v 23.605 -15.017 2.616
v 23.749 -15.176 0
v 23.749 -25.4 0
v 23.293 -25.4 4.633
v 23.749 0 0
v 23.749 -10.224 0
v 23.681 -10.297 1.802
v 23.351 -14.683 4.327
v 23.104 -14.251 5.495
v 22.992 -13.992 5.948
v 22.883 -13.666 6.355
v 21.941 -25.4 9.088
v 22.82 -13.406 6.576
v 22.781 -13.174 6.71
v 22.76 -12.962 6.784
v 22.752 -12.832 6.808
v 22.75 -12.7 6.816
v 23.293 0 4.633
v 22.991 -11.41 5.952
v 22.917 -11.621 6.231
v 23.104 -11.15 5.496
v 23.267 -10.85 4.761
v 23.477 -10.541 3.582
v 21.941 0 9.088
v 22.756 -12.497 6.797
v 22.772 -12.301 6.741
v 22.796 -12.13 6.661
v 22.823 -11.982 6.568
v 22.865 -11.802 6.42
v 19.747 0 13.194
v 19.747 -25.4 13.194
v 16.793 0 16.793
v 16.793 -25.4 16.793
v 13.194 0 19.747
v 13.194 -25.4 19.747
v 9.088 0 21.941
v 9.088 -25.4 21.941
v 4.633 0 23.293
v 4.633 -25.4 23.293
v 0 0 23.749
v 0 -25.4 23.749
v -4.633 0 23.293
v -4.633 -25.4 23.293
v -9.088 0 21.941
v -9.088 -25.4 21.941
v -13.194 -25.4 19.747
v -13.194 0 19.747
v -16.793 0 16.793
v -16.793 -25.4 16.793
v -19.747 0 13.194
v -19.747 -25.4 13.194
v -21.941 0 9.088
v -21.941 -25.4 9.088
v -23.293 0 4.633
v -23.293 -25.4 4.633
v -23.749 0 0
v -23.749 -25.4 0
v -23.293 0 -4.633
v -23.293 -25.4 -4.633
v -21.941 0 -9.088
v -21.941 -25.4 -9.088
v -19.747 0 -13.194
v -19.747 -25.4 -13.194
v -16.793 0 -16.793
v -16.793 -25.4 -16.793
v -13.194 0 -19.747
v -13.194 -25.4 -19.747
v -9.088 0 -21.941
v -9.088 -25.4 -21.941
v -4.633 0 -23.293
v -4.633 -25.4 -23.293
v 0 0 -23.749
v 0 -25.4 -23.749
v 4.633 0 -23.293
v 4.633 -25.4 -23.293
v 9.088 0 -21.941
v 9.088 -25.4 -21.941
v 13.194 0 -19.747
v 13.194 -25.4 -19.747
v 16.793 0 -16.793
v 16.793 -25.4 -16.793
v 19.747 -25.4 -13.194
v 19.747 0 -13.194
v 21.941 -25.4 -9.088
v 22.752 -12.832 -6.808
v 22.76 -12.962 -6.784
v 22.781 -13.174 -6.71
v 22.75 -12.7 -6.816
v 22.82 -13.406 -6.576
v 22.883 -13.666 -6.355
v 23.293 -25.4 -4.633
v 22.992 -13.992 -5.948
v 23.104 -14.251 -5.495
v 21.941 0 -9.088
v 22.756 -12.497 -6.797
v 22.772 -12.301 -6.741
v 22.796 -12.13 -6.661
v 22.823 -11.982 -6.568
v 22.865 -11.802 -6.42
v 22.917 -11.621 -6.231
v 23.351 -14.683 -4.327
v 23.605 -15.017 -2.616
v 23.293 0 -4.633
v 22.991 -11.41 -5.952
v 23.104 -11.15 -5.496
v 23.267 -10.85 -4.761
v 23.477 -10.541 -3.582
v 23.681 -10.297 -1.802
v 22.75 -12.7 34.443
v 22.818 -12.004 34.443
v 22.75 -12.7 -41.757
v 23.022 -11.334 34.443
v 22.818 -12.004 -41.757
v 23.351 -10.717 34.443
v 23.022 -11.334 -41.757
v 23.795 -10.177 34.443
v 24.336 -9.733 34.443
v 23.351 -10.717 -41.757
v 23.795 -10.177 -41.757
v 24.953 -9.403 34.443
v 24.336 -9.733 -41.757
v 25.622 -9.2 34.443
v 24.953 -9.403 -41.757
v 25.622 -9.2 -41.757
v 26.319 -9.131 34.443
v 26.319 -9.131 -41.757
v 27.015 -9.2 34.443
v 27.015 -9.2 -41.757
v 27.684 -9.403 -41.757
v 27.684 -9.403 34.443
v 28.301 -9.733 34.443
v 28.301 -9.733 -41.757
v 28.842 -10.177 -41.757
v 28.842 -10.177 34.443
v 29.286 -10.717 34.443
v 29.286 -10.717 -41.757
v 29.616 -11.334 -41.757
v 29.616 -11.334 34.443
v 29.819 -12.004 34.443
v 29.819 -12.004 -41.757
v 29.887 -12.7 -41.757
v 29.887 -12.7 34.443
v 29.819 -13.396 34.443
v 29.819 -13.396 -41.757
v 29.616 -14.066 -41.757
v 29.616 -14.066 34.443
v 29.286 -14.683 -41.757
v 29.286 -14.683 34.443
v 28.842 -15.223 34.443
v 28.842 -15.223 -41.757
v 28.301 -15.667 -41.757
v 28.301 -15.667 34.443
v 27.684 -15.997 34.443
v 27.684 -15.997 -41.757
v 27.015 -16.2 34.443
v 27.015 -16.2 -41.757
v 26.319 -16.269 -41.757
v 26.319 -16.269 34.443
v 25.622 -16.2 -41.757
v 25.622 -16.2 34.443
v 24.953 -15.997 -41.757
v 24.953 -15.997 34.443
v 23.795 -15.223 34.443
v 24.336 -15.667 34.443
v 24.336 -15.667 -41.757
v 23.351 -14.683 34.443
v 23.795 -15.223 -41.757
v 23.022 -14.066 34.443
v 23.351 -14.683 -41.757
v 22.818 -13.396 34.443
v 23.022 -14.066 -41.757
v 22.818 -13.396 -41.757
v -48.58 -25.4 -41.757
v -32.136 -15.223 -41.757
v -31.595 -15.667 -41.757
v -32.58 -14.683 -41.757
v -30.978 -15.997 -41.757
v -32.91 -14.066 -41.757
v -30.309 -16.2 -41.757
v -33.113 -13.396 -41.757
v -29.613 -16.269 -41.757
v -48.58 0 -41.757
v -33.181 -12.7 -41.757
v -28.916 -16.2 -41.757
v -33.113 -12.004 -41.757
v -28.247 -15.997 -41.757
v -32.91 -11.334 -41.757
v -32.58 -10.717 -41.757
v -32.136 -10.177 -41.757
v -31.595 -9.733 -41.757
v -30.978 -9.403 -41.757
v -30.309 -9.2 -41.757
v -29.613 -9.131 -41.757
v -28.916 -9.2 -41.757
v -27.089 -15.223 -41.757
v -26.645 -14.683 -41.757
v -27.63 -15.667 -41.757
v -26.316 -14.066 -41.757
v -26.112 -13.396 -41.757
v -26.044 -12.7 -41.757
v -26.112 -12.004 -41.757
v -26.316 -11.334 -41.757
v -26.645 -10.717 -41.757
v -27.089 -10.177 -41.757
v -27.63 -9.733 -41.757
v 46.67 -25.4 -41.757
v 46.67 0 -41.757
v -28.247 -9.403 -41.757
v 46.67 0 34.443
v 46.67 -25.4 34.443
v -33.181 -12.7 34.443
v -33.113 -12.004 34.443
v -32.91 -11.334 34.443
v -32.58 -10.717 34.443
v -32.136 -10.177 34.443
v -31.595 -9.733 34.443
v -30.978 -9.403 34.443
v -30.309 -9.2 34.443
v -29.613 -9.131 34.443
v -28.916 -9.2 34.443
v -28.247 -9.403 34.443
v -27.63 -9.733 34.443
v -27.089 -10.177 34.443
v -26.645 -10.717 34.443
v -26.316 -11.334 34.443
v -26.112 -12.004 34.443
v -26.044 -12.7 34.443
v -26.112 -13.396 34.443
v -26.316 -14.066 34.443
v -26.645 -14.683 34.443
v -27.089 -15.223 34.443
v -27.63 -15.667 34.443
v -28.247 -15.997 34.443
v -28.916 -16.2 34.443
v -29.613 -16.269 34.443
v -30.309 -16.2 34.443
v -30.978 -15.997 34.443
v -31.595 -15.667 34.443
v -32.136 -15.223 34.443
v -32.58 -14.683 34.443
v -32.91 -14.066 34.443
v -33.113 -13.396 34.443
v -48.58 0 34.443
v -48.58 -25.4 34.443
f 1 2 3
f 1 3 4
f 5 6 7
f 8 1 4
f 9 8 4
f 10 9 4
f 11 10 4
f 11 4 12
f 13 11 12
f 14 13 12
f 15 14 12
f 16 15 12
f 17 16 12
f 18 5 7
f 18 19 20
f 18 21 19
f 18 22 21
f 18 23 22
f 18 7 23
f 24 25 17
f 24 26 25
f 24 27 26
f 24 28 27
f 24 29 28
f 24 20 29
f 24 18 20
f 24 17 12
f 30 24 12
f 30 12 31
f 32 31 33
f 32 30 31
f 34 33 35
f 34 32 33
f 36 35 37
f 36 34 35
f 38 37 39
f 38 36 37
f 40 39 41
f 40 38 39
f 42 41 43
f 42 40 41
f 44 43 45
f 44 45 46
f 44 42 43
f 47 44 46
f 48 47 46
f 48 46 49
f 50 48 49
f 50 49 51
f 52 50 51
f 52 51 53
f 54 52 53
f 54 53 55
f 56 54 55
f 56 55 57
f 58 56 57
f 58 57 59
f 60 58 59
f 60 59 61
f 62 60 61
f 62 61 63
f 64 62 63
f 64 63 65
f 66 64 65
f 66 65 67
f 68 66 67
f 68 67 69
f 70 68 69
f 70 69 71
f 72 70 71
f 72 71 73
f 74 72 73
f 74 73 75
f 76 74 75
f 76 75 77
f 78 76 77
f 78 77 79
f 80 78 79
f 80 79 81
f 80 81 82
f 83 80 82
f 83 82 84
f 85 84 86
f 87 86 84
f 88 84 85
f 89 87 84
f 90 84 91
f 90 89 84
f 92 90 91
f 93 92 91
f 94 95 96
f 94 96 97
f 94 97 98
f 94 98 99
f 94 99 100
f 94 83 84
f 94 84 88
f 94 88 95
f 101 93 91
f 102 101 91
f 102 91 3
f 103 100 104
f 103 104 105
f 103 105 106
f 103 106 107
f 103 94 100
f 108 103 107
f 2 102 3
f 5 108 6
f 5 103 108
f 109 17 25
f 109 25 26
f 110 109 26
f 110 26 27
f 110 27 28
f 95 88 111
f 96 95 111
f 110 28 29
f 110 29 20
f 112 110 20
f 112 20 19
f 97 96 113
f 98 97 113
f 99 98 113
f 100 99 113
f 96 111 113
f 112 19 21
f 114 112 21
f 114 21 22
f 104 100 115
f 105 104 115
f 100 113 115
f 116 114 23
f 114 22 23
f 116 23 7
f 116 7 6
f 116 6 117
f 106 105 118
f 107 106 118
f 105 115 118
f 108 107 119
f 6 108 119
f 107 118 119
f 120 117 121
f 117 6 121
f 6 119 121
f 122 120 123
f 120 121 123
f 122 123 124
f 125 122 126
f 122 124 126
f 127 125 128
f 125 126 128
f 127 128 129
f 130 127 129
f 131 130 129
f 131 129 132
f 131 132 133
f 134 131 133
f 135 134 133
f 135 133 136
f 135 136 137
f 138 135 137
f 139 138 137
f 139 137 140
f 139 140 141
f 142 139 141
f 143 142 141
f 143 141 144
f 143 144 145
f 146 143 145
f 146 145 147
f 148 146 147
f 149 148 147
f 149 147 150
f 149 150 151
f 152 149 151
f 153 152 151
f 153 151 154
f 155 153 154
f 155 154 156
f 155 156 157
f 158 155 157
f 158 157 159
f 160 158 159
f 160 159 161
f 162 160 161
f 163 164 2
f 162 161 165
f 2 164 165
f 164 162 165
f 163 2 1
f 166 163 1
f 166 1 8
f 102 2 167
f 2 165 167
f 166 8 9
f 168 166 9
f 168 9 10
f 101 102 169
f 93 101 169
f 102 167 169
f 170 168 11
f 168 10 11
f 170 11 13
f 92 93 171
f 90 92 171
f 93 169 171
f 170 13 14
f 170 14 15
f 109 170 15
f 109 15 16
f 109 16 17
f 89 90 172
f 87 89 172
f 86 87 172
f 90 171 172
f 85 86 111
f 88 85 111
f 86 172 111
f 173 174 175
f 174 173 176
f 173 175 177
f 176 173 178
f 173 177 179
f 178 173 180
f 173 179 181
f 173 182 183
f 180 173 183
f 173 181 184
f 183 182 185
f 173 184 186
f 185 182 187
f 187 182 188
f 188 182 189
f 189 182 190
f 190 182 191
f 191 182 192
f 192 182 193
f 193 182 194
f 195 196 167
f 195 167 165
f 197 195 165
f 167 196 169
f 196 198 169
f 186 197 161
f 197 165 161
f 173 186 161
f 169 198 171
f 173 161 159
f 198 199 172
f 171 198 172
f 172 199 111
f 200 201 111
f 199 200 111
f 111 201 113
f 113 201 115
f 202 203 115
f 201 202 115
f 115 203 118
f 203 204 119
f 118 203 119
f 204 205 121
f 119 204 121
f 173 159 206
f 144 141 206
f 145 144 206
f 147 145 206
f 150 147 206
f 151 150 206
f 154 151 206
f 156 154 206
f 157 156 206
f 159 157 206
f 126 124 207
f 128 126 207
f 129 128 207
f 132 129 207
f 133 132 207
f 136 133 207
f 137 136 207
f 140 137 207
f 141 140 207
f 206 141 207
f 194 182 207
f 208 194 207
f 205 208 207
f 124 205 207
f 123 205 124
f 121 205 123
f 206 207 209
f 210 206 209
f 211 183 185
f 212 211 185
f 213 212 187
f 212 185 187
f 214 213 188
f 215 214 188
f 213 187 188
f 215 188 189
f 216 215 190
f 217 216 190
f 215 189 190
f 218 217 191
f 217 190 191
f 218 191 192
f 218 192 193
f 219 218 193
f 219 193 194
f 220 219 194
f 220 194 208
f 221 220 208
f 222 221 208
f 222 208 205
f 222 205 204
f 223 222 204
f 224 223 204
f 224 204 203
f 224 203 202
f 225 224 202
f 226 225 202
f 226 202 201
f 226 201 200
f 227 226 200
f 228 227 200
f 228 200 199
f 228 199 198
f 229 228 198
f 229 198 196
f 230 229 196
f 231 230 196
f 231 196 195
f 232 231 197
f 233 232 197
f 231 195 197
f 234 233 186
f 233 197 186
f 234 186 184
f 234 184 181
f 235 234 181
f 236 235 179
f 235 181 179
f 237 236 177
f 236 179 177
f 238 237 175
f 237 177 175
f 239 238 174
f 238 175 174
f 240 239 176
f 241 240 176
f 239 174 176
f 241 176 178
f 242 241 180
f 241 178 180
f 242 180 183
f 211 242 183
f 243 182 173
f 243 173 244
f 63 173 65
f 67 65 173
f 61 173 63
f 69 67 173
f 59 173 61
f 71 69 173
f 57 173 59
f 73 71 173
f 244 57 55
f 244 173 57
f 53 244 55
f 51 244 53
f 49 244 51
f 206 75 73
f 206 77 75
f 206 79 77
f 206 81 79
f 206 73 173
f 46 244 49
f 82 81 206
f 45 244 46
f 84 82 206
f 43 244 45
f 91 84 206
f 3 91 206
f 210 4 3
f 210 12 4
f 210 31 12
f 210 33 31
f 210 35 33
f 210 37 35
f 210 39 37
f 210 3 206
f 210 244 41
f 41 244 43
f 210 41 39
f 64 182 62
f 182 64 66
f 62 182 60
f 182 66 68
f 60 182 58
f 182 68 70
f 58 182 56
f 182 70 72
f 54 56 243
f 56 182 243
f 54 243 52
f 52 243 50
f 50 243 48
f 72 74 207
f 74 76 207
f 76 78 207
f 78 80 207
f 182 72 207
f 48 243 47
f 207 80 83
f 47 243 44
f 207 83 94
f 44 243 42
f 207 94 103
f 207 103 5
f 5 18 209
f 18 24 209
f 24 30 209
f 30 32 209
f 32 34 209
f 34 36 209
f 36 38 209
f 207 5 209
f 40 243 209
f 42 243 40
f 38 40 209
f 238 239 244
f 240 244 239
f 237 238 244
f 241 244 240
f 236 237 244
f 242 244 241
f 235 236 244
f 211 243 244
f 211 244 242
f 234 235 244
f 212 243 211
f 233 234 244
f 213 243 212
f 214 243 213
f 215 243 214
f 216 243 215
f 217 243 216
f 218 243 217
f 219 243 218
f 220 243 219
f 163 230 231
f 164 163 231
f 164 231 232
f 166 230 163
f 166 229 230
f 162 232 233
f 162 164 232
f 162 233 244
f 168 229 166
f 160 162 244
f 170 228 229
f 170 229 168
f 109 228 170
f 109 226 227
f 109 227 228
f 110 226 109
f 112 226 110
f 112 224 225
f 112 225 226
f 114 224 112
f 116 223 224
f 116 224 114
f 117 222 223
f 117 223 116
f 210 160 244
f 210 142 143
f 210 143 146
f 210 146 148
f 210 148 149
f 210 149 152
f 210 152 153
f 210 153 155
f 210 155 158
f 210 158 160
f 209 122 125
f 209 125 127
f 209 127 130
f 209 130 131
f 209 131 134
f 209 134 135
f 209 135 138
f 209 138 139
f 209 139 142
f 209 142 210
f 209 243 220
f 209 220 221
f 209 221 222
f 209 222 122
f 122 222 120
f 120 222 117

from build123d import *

# Parameters (mm, degrees)
F0_W     = 95.25
F0_H     = 76.2
F0_R     = 23.749
F1_DEPTH = 25.4
F3_D     = 7.1374


with BuildPart() as f1:
    # F0 (on Front) → F1 (new body)
    with BuildSketch(Plane.XZ):
        with Locations((-0.95523, -3.657167)):
            Rectangle(F0_W, F0_H)
        Circle(F0_R, mode=Mode.SUBTRACT)
    extrude(amount=F1_DEPTH)

    # F3 (through all)
    with Locations(Plane.XY.offset(34.442833)):
        with Locations((-29.612565, -12.7), (26.31861, -12.7)):
            Hole(F3_D / 2)


solid = f1.part
